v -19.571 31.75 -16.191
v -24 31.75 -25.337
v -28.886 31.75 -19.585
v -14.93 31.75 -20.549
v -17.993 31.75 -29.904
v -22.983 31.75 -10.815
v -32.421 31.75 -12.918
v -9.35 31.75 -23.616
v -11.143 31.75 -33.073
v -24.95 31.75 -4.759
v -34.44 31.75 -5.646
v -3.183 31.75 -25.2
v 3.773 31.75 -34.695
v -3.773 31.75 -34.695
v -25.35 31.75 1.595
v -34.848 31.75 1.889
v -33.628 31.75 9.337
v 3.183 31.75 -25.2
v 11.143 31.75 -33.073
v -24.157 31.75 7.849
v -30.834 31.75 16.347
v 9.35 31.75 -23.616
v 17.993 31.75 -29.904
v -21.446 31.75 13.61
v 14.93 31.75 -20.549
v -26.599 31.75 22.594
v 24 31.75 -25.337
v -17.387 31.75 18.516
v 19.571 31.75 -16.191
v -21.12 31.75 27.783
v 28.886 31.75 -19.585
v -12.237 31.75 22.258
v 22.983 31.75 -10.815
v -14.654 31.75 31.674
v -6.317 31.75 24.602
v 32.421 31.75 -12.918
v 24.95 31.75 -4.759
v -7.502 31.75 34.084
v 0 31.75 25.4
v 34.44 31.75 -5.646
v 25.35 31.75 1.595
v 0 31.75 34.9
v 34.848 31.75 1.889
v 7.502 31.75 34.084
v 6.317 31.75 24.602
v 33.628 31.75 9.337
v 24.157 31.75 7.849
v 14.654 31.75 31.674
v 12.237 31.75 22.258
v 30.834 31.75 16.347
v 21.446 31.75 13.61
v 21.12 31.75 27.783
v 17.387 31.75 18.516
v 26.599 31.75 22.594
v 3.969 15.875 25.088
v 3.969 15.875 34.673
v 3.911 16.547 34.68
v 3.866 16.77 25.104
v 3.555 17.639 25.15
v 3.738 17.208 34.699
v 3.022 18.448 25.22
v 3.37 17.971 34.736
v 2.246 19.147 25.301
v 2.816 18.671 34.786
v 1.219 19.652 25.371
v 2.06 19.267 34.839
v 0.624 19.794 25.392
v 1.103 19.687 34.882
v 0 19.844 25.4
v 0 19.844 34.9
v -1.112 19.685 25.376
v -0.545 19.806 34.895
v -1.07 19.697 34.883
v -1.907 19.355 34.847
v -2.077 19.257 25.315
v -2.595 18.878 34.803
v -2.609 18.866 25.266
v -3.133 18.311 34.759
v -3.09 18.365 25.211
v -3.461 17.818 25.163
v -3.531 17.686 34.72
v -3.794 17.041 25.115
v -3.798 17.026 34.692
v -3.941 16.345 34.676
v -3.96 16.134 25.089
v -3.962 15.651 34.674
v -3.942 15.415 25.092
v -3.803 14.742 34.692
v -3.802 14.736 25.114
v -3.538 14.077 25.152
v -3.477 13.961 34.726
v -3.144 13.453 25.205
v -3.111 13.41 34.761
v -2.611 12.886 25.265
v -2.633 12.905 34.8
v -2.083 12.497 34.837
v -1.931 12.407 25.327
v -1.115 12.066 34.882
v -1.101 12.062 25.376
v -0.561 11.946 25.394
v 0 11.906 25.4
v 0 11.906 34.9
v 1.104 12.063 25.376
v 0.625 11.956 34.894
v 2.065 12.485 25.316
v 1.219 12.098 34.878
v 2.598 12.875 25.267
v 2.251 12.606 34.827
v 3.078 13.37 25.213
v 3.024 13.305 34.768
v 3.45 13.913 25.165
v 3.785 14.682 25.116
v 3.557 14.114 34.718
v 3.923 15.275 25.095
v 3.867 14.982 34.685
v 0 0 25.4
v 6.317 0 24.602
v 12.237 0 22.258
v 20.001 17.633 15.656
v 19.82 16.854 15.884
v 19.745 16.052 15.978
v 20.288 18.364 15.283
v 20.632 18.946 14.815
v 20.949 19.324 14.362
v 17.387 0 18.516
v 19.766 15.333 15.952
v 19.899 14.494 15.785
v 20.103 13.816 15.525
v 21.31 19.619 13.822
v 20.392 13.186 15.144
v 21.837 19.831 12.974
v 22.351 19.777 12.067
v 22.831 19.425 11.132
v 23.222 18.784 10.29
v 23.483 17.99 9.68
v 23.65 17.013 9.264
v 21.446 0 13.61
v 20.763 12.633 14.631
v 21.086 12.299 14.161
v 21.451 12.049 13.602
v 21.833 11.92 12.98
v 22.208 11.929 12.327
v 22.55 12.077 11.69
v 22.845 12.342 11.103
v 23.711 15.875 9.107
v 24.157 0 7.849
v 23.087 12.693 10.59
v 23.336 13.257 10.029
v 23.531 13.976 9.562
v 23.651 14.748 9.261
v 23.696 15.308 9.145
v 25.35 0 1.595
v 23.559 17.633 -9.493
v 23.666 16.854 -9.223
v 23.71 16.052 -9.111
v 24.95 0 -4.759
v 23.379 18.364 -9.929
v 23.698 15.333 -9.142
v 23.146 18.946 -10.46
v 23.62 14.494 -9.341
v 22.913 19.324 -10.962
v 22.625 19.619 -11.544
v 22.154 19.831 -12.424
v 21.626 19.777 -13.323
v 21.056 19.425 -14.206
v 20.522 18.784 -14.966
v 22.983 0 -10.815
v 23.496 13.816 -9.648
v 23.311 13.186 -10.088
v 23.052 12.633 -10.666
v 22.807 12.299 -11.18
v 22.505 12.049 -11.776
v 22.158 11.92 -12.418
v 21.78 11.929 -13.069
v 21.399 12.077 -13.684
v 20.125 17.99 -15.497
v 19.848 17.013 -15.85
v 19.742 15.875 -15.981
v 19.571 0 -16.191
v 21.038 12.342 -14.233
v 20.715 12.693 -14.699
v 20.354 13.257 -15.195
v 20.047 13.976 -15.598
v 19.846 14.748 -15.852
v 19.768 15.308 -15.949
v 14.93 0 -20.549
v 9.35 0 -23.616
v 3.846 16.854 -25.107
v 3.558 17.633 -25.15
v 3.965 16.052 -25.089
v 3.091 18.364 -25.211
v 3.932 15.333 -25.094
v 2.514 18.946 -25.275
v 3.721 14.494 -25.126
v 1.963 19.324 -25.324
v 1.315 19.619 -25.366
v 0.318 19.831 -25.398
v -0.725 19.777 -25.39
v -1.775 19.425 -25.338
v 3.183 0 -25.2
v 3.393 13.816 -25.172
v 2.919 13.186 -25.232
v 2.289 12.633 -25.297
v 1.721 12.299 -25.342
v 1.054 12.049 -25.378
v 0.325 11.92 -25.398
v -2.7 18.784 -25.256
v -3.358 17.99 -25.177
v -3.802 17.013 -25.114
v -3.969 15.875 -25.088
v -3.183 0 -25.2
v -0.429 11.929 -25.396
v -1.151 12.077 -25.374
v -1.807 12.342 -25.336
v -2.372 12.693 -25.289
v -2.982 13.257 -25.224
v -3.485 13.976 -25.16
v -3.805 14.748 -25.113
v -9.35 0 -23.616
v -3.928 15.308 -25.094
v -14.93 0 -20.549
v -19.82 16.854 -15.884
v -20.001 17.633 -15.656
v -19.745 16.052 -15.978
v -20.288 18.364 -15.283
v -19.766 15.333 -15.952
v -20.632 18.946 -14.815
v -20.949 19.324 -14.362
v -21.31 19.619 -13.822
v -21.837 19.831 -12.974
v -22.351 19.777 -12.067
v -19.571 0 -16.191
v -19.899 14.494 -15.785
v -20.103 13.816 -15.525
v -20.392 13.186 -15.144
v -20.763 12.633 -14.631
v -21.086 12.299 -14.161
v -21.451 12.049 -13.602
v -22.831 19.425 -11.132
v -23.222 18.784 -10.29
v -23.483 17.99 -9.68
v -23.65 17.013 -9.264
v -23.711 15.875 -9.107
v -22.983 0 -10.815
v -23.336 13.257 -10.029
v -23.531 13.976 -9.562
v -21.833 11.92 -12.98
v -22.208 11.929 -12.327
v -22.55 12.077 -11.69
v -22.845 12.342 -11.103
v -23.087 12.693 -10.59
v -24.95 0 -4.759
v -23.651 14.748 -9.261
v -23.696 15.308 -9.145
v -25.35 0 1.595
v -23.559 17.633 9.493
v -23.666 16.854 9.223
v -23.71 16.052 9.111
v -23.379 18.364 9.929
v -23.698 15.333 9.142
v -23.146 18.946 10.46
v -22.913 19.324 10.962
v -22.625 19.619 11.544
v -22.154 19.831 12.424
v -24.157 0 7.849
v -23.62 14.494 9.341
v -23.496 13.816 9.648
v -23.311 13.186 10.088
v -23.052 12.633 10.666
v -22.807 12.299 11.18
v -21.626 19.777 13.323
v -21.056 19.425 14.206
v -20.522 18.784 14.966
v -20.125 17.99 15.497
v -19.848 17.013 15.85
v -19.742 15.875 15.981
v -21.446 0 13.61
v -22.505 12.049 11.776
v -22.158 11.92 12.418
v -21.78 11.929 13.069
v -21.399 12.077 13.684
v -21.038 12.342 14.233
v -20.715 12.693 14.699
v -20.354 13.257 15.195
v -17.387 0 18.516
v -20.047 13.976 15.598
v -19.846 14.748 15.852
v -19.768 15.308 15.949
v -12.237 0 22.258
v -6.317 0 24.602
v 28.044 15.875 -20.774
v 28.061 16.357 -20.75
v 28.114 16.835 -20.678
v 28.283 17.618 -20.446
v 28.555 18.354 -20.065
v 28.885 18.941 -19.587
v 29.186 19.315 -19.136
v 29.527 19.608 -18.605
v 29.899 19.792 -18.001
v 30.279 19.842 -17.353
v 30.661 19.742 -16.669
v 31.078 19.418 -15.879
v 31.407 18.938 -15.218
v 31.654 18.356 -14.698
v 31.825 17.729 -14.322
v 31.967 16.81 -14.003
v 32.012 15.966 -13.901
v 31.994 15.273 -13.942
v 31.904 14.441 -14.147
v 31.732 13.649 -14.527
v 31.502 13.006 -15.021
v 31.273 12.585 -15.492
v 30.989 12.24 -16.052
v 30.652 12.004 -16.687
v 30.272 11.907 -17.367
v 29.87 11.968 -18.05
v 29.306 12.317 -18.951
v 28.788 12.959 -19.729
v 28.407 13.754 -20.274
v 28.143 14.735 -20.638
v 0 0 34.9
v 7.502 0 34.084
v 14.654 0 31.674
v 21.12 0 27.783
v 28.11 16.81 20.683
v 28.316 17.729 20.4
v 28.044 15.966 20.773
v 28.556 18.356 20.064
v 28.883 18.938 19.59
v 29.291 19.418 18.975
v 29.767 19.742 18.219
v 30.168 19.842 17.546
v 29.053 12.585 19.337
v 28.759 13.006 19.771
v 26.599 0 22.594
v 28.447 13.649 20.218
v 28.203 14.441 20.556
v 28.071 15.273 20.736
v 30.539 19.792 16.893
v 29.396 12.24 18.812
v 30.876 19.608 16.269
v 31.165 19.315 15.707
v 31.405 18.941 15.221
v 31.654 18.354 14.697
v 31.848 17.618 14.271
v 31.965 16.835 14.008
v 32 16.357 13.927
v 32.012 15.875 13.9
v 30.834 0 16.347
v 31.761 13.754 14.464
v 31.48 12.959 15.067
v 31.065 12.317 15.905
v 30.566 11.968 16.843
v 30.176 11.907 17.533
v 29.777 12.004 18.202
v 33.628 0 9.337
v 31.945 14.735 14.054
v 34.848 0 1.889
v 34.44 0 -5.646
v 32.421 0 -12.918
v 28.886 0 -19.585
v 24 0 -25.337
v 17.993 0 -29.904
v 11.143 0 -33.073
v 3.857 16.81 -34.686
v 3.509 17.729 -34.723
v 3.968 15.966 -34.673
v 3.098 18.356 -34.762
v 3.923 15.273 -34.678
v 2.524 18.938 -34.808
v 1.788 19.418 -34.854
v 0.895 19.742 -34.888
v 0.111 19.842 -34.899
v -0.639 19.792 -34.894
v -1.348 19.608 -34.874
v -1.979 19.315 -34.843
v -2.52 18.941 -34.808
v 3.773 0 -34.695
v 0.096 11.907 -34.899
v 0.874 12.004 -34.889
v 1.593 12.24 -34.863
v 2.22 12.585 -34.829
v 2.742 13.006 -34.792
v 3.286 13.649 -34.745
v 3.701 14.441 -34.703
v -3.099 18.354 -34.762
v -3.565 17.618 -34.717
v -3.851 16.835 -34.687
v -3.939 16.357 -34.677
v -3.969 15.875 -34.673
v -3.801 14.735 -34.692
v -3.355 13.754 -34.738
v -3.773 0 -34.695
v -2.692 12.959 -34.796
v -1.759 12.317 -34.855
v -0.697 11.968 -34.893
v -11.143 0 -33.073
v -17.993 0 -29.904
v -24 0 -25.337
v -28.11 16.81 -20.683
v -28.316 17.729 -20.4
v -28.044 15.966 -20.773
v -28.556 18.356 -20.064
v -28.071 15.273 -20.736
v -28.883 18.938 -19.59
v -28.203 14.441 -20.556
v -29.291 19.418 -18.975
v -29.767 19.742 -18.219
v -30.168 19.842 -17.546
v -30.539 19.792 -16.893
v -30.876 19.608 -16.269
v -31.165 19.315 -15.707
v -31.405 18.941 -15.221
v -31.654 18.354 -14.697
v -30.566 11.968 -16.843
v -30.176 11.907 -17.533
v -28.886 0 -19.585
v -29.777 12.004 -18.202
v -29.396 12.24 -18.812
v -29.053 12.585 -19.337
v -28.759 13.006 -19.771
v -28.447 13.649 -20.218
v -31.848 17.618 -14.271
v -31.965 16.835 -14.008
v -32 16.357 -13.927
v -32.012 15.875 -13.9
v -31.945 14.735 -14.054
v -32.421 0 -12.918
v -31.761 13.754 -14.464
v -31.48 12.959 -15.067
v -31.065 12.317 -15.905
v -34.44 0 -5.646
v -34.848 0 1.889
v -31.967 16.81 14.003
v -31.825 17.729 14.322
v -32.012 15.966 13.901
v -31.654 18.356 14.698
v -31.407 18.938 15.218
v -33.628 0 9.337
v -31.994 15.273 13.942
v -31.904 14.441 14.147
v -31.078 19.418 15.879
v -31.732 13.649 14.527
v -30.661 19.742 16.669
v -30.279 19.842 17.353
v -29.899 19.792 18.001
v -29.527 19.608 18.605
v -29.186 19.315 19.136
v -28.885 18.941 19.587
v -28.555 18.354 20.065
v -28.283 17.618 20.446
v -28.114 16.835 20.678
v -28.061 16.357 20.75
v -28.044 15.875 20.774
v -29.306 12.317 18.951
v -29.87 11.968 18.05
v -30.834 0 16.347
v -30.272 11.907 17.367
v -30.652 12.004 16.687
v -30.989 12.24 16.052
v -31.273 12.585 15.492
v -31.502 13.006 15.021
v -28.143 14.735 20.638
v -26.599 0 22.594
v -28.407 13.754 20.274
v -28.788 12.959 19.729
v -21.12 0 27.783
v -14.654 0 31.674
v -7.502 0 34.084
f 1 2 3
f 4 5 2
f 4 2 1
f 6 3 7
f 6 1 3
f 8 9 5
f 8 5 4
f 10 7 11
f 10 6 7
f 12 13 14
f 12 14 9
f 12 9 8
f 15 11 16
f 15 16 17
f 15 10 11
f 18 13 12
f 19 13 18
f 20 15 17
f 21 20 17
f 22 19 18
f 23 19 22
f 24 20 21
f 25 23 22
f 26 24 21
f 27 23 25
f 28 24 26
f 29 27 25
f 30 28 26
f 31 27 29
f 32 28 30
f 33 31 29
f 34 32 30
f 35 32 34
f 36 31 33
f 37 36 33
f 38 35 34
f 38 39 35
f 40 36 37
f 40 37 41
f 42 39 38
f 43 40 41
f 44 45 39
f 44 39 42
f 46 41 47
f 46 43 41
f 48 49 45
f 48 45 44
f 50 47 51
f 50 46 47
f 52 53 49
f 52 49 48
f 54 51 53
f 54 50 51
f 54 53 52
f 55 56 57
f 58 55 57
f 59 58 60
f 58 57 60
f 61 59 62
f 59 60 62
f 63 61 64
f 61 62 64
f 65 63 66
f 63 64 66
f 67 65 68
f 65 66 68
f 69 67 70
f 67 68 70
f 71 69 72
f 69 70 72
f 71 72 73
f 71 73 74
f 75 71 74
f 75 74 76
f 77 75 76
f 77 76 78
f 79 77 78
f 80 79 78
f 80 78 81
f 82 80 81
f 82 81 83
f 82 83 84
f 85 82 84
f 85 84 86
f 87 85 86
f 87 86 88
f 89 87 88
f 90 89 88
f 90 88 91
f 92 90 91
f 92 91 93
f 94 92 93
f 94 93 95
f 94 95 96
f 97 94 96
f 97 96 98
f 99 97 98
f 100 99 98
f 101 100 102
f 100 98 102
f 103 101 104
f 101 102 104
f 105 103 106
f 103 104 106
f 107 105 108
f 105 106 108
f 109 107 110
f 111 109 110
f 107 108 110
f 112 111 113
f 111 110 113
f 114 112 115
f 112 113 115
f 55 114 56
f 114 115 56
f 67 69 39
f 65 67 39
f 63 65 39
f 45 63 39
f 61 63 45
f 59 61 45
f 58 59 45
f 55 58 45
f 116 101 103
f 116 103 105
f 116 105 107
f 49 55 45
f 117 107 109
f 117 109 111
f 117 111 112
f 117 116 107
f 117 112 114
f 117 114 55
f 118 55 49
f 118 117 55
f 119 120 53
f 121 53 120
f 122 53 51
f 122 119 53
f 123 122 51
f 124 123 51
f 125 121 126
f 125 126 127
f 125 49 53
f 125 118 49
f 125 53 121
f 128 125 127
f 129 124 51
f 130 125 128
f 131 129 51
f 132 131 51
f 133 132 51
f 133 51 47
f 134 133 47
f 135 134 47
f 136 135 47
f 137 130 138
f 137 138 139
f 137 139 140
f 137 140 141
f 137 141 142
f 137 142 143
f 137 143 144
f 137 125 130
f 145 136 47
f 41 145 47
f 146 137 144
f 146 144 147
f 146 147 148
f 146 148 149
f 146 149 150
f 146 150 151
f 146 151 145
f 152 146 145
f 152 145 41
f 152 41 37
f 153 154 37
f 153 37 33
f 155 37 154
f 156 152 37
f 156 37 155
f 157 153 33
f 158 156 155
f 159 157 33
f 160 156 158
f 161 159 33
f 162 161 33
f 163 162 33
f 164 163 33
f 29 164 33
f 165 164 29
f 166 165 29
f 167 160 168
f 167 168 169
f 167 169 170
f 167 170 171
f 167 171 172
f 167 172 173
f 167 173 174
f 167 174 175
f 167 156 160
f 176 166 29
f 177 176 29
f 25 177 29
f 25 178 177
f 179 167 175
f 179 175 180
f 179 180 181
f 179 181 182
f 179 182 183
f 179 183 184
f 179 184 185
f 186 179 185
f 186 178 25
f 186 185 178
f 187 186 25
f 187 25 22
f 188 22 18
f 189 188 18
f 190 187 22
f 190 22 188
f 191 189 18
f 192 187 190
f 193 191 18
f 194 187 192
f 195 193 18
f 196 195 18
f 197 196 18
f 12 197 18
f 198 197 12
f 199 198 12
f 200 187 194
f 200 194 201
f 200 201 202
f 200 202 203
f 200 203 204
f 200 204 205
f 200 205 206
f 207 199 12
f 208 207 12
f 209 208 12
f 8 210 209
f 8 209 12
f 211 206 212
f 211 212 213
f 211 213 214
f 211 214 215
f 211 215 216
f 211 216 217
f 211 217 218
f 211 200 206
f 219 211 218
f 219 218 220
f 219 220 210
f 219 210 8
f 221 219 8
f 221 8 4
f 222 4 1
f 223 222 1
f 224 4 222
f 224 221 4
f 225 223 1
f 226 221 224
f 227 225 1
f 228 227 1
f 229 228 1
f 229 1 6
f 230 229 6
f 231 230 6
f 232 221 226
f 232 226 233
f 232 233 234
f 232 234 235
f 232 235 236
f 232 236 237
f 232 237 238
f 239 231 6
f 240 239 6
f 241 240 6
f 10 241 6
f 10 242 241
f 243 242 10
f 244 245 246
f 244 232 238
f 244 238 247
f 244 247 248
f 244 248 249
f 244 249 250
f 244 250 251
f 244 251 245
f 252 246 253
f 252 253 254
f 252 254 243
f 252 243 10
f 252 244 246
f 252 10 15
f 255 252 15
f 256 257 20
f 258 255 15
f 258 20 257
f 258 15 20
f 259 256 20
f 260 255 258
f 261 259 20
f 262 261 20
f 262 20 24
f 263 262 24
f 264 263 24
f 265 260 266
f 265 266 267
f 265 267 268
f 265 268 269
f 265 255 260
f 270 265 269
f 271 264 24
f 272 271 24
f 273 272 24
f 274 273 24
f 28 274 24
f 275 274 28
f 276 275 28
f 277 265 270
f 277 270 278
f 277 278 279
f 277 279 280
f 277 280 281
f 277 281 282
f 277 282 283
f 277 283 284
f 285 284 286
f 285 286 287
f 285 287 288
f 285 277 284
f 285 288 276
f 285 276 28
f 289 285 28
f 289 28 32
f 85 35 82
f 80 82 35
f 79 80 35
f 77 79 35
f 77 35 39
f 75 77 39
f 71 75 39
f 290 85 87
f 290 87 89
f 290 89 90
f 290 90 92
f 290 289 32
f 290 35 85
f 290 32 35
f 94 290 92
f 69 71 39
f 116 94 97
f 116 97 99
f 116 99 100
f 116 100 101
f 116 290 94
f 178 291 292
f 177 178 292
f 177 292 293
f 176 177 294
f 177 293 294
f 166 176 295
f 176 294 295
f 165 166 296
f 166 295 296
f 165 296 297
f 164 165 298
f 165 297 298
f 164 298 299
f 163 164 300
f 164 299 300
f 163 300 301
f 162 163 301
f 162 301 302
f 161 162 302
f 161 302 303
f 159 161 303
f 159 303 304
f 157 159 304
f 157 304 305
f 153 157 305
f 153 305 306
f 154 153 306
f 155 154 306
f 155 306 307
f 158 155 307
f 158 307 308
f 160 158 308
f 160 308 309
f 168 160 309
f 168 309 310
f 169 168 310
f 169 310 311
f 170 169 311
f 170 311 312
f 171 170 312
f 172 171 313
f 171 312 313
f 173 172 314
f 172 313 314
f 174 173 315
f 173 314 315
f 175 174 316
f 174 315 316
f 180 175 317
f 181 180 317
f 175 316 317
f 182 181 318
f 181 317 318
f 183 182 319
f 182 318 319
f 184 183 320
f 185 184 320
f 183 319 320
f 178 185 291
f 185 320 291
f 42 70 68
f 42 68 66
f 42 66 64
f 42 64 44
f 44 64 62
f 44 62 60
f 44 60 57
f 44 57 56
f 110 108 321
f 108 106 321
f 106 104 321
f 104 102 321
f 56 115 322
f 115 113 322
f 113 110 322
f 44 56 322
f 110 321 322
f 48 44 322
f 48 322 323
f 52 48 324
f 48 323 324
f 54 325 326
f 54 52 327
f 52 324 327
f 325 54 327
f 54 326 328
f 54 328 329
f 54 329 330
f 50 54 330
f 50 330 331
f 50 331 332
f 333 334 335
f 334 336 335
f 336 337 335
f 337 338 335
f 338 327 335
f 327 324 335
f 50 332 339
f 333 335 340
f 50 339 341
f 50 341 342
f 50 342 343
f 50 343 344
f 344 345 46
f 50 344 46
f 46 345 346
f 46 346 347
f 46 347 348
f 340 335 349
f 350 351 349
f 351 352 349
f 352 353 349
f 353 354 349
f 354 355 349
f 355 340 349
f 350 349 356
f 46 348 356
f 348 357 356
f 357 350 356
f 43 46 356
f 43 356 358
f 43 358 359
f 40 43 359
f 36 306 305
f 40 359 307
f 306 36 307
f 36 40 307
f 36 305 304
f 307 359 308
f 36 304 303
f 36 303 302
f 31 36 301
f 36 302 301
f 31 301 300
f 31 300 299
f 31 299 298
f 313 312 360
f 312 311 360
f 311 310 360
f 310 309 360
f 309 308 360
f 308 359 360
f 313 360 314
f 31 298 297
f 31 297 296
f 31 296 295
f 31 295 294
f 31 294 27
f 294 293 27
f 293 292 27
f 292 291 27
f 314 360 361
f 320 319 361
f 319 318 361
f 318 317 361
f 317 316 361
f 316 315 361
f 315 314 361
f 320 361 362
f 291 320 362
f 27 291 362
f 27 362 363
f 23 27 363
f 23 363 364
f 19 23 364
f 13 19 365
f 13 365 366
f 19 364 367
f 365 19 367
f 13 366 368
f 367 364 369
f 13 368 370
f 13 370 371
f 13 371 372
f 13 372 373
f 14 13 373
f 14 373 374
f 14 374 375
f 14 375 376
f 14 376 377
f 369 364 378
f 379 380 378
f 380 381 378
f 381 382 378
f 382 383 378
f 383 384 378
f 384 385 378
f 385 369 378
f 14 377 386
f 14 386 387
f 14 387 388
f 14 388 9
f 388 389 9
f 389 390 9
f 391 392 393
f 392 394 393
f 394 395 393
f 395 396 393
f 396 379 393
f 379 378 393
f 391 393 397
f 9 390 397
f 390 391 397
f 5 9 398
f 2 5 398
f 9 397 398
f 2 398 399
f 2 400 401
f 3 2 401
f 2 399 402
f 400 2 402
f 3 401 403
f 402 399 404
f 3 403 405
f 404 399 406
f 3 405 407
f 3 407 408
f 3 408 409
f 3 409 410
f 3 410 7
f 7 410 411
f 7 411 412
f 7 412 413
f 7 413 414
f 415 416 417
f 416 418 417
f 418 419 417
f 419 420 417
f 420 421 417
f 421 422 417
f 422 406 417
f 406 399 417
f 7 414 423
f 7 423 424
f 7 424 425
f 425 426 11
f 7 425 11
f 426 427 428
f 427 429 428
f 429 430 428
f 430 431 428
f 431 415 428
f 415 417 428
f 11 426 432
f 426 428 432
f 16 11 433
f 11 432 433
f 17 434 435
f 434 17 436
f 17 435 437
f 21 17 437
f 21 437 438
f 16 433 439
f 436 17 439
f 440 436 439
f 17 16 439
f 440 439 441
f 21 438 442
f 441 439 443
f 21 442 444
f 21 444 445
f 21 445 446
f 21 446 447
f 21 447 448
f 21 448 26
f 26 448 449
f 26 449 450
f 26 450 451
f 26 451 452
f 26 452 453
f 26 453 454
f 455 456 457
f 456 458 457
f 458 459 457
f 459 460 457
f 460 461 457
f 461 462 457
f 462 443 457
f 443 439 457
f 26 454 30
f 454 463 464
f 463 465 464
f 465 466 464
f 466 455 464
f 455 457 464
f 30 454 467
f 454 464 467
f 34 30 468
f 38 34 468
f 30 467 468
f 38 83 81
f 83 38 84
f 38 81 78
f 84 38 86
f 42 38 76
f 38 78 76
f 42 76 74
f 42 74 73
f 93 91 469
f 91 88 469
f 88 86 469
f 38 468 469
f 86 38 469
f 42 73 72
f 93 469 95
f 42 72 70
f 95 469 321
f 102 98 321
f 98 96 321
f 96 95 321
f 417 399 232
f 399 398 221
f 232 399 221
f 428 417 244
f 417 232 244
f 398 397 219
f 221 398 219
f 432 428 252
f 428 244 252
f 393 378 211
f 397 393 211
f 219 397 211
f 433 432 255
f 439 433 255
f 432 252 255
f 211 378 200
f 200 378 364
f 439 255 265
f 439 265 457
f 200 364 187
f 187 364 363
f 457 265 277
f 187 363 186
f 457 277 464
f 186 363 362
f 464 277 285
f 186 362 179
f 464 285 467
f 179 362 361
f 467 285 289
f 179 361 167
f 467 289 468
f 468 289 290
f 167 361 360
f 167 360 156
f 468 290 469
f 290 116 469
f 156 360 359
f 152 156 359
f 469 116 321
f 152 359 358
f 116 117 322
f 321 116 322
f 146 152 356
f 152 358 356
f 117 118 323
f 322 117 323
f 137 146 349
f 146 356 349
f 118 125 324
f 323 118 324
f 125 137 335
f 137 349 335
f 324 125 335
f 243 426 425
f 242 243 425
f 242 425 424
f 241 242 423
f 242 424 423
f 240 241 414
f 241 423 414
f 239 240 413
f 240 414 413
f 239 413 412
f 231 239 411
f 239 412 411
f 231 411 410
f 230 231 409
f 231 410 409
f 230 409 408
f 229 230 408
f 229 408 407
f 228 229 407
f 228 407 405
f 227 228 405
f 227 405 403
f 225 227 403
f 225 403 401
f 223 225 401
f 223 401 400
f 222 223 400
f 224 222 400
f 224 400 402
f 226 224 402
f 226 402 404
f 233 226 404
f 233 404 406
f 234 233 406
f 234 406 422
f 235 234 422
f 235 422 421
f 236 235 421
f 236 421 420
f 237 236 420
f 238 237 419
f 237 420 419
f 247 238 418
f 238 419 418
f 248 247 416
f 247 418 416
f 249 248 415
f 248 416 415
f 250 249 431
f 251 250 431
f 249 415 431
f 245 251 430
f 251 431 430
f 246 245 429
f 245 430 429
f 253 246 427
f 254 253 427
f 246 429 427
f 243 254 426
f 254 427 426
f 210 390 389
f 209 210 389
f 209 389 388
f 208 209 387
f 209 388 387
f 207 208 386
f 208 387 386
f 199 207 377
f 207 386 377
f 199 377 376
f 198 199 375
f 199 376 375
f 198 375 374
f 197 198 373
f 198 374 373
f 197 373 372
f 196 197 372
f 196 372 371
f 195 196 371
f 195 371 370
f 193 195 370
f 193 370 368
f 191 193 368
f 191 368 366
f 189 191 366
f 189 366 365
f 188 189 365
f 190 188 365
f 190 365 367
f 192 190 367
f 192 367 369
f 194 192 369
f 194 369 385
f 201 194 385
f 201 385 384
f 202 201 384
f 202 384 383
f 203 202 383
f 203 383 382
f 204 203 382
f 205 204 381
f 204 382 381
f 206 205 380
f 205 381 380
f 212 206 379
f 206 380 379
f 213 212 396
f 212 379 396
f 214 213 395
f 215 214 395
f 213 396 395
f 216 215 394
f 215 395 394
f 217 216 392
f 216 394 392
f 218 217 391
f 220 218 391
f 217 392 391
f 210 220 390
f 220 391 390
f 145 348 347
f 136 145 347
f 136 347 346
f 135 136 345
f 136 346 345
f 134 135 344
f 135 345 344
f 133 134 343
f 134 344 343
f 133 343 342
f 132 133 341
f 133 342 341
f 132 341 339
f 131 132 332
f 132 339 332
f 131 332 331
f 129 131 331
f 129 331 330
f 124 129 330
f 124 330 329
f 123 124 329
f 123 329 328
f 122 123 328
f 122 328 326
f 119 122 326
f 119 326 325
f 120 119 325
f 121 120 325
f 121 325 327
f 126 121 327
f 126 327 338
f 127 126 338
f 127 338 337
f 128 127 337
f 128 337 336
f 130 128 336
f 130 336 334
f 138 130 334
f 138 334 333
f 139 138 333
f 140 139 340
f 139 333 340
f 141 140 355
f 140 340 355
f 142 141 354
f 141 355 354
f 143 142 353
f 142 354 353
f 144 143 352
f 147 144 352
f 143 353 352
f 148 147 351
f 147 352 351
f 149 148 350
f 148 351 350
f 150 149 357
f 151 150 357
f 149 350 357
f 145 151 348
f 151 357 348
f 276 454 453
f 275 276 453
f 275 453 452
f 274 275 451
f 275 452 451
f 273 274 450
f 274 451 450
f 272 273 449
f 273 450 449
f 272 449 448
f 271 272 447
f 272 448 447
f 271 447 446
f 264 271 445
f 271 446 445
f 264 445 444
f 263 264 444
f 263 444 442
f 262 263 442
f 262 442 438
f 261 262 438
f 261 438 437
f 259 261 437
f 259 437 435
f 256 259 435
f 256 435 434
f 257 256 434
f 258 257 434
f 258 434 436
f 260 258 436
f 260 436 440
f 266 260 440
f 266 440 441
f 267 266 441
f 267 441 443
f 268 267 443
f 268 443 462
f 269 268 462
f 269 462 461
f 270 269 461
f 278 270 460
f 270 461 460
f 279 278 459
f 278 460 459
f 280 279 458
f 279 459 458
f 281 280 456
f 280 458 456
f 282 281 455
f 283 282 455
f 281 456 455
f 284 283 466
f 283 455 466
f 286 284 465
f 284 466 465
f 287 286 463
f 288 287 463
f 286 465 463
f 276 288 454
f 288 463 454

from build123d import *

# Parameters (mm, degrees)
SKETCH1_R                        = 34.8996
SKETCH1_R_2                      = 25.4
BOSS_EXTRUDE1_DEPTH              = 31.75
TAP_DRILL_FOR_3_8_16_TAP1_REACH  = 86.249
TAP_DRILL_FOR_3_8_16_TAP1_BORE_R = 3.96875
CIRPATTERN2_COUNT                = 6


with BuildPart() as part:
    # Sketch1 → Boss-Extrude1 (new body)
    with BuildSketch(Plane(origin=(0, 0, 0), x_dir=(1, 0, 0), z_dir=(0, 1, 0))):
        with Locations(Location((0, 0, 0), (0, 0, 270))):
            Circle(SKETCH1_R)
        with Locations(Location((0, 0, 0), (0, 0, 270))):
            Circle(SKETCH1_R_2, mode=Mode.SUBTRACT)
    extrude(amount=BOSS_EXTRUDE1_DEPTH)

    # Tap Drill for 3/8-16 Tap1 bore → Tap Drill for 3/8-16 Tap1 (cut, up to next)
    with BuildSketch(Plane.XY.offset(34.8996), mode=Mode.PRIVATE) as tap_drill_for_3_8_16_tap1_sk1:
        with Locations((0, 15.875)):
            Circle(TAP_DRILL_FOR_3_8_16_TAP1_BORE_R)
    tap_drill_for_3_8_16_tap1_tool1 = extrude(tap_drill_for_3_8_16_tap1_sk1.sketch, amount=-TAP_DRILL_FOR_3_8_16_TAP1_REACH, mode=Mode.PRIVATE) & part.part
    tap_drill_for_3_8_16_tap1 = tap_drill_for_3_8_16_tap1_tool1.solids().sort_by_distance((0, 15.875, 34.8996))[0]
    add(tap_drill_for_3_8_16_tap1, mode=Mode.SUBTRACT)

    # CirPattern2: Tap Drill for 3/8-16 Tap1 ×6 about axis
    cirpattern2_axis = Axis((0, 31.75, 0), (0, -1, 0))
    for i in range(1, CIRPATTERN2_COUNT):
        add(tap_drill_for_3_8_16_tap1.rotate(cirpattern2_axis, i * 360 / CIRPATTERN2_COUNT), mode=Mode.SUBTRACT)


solid = part.part
